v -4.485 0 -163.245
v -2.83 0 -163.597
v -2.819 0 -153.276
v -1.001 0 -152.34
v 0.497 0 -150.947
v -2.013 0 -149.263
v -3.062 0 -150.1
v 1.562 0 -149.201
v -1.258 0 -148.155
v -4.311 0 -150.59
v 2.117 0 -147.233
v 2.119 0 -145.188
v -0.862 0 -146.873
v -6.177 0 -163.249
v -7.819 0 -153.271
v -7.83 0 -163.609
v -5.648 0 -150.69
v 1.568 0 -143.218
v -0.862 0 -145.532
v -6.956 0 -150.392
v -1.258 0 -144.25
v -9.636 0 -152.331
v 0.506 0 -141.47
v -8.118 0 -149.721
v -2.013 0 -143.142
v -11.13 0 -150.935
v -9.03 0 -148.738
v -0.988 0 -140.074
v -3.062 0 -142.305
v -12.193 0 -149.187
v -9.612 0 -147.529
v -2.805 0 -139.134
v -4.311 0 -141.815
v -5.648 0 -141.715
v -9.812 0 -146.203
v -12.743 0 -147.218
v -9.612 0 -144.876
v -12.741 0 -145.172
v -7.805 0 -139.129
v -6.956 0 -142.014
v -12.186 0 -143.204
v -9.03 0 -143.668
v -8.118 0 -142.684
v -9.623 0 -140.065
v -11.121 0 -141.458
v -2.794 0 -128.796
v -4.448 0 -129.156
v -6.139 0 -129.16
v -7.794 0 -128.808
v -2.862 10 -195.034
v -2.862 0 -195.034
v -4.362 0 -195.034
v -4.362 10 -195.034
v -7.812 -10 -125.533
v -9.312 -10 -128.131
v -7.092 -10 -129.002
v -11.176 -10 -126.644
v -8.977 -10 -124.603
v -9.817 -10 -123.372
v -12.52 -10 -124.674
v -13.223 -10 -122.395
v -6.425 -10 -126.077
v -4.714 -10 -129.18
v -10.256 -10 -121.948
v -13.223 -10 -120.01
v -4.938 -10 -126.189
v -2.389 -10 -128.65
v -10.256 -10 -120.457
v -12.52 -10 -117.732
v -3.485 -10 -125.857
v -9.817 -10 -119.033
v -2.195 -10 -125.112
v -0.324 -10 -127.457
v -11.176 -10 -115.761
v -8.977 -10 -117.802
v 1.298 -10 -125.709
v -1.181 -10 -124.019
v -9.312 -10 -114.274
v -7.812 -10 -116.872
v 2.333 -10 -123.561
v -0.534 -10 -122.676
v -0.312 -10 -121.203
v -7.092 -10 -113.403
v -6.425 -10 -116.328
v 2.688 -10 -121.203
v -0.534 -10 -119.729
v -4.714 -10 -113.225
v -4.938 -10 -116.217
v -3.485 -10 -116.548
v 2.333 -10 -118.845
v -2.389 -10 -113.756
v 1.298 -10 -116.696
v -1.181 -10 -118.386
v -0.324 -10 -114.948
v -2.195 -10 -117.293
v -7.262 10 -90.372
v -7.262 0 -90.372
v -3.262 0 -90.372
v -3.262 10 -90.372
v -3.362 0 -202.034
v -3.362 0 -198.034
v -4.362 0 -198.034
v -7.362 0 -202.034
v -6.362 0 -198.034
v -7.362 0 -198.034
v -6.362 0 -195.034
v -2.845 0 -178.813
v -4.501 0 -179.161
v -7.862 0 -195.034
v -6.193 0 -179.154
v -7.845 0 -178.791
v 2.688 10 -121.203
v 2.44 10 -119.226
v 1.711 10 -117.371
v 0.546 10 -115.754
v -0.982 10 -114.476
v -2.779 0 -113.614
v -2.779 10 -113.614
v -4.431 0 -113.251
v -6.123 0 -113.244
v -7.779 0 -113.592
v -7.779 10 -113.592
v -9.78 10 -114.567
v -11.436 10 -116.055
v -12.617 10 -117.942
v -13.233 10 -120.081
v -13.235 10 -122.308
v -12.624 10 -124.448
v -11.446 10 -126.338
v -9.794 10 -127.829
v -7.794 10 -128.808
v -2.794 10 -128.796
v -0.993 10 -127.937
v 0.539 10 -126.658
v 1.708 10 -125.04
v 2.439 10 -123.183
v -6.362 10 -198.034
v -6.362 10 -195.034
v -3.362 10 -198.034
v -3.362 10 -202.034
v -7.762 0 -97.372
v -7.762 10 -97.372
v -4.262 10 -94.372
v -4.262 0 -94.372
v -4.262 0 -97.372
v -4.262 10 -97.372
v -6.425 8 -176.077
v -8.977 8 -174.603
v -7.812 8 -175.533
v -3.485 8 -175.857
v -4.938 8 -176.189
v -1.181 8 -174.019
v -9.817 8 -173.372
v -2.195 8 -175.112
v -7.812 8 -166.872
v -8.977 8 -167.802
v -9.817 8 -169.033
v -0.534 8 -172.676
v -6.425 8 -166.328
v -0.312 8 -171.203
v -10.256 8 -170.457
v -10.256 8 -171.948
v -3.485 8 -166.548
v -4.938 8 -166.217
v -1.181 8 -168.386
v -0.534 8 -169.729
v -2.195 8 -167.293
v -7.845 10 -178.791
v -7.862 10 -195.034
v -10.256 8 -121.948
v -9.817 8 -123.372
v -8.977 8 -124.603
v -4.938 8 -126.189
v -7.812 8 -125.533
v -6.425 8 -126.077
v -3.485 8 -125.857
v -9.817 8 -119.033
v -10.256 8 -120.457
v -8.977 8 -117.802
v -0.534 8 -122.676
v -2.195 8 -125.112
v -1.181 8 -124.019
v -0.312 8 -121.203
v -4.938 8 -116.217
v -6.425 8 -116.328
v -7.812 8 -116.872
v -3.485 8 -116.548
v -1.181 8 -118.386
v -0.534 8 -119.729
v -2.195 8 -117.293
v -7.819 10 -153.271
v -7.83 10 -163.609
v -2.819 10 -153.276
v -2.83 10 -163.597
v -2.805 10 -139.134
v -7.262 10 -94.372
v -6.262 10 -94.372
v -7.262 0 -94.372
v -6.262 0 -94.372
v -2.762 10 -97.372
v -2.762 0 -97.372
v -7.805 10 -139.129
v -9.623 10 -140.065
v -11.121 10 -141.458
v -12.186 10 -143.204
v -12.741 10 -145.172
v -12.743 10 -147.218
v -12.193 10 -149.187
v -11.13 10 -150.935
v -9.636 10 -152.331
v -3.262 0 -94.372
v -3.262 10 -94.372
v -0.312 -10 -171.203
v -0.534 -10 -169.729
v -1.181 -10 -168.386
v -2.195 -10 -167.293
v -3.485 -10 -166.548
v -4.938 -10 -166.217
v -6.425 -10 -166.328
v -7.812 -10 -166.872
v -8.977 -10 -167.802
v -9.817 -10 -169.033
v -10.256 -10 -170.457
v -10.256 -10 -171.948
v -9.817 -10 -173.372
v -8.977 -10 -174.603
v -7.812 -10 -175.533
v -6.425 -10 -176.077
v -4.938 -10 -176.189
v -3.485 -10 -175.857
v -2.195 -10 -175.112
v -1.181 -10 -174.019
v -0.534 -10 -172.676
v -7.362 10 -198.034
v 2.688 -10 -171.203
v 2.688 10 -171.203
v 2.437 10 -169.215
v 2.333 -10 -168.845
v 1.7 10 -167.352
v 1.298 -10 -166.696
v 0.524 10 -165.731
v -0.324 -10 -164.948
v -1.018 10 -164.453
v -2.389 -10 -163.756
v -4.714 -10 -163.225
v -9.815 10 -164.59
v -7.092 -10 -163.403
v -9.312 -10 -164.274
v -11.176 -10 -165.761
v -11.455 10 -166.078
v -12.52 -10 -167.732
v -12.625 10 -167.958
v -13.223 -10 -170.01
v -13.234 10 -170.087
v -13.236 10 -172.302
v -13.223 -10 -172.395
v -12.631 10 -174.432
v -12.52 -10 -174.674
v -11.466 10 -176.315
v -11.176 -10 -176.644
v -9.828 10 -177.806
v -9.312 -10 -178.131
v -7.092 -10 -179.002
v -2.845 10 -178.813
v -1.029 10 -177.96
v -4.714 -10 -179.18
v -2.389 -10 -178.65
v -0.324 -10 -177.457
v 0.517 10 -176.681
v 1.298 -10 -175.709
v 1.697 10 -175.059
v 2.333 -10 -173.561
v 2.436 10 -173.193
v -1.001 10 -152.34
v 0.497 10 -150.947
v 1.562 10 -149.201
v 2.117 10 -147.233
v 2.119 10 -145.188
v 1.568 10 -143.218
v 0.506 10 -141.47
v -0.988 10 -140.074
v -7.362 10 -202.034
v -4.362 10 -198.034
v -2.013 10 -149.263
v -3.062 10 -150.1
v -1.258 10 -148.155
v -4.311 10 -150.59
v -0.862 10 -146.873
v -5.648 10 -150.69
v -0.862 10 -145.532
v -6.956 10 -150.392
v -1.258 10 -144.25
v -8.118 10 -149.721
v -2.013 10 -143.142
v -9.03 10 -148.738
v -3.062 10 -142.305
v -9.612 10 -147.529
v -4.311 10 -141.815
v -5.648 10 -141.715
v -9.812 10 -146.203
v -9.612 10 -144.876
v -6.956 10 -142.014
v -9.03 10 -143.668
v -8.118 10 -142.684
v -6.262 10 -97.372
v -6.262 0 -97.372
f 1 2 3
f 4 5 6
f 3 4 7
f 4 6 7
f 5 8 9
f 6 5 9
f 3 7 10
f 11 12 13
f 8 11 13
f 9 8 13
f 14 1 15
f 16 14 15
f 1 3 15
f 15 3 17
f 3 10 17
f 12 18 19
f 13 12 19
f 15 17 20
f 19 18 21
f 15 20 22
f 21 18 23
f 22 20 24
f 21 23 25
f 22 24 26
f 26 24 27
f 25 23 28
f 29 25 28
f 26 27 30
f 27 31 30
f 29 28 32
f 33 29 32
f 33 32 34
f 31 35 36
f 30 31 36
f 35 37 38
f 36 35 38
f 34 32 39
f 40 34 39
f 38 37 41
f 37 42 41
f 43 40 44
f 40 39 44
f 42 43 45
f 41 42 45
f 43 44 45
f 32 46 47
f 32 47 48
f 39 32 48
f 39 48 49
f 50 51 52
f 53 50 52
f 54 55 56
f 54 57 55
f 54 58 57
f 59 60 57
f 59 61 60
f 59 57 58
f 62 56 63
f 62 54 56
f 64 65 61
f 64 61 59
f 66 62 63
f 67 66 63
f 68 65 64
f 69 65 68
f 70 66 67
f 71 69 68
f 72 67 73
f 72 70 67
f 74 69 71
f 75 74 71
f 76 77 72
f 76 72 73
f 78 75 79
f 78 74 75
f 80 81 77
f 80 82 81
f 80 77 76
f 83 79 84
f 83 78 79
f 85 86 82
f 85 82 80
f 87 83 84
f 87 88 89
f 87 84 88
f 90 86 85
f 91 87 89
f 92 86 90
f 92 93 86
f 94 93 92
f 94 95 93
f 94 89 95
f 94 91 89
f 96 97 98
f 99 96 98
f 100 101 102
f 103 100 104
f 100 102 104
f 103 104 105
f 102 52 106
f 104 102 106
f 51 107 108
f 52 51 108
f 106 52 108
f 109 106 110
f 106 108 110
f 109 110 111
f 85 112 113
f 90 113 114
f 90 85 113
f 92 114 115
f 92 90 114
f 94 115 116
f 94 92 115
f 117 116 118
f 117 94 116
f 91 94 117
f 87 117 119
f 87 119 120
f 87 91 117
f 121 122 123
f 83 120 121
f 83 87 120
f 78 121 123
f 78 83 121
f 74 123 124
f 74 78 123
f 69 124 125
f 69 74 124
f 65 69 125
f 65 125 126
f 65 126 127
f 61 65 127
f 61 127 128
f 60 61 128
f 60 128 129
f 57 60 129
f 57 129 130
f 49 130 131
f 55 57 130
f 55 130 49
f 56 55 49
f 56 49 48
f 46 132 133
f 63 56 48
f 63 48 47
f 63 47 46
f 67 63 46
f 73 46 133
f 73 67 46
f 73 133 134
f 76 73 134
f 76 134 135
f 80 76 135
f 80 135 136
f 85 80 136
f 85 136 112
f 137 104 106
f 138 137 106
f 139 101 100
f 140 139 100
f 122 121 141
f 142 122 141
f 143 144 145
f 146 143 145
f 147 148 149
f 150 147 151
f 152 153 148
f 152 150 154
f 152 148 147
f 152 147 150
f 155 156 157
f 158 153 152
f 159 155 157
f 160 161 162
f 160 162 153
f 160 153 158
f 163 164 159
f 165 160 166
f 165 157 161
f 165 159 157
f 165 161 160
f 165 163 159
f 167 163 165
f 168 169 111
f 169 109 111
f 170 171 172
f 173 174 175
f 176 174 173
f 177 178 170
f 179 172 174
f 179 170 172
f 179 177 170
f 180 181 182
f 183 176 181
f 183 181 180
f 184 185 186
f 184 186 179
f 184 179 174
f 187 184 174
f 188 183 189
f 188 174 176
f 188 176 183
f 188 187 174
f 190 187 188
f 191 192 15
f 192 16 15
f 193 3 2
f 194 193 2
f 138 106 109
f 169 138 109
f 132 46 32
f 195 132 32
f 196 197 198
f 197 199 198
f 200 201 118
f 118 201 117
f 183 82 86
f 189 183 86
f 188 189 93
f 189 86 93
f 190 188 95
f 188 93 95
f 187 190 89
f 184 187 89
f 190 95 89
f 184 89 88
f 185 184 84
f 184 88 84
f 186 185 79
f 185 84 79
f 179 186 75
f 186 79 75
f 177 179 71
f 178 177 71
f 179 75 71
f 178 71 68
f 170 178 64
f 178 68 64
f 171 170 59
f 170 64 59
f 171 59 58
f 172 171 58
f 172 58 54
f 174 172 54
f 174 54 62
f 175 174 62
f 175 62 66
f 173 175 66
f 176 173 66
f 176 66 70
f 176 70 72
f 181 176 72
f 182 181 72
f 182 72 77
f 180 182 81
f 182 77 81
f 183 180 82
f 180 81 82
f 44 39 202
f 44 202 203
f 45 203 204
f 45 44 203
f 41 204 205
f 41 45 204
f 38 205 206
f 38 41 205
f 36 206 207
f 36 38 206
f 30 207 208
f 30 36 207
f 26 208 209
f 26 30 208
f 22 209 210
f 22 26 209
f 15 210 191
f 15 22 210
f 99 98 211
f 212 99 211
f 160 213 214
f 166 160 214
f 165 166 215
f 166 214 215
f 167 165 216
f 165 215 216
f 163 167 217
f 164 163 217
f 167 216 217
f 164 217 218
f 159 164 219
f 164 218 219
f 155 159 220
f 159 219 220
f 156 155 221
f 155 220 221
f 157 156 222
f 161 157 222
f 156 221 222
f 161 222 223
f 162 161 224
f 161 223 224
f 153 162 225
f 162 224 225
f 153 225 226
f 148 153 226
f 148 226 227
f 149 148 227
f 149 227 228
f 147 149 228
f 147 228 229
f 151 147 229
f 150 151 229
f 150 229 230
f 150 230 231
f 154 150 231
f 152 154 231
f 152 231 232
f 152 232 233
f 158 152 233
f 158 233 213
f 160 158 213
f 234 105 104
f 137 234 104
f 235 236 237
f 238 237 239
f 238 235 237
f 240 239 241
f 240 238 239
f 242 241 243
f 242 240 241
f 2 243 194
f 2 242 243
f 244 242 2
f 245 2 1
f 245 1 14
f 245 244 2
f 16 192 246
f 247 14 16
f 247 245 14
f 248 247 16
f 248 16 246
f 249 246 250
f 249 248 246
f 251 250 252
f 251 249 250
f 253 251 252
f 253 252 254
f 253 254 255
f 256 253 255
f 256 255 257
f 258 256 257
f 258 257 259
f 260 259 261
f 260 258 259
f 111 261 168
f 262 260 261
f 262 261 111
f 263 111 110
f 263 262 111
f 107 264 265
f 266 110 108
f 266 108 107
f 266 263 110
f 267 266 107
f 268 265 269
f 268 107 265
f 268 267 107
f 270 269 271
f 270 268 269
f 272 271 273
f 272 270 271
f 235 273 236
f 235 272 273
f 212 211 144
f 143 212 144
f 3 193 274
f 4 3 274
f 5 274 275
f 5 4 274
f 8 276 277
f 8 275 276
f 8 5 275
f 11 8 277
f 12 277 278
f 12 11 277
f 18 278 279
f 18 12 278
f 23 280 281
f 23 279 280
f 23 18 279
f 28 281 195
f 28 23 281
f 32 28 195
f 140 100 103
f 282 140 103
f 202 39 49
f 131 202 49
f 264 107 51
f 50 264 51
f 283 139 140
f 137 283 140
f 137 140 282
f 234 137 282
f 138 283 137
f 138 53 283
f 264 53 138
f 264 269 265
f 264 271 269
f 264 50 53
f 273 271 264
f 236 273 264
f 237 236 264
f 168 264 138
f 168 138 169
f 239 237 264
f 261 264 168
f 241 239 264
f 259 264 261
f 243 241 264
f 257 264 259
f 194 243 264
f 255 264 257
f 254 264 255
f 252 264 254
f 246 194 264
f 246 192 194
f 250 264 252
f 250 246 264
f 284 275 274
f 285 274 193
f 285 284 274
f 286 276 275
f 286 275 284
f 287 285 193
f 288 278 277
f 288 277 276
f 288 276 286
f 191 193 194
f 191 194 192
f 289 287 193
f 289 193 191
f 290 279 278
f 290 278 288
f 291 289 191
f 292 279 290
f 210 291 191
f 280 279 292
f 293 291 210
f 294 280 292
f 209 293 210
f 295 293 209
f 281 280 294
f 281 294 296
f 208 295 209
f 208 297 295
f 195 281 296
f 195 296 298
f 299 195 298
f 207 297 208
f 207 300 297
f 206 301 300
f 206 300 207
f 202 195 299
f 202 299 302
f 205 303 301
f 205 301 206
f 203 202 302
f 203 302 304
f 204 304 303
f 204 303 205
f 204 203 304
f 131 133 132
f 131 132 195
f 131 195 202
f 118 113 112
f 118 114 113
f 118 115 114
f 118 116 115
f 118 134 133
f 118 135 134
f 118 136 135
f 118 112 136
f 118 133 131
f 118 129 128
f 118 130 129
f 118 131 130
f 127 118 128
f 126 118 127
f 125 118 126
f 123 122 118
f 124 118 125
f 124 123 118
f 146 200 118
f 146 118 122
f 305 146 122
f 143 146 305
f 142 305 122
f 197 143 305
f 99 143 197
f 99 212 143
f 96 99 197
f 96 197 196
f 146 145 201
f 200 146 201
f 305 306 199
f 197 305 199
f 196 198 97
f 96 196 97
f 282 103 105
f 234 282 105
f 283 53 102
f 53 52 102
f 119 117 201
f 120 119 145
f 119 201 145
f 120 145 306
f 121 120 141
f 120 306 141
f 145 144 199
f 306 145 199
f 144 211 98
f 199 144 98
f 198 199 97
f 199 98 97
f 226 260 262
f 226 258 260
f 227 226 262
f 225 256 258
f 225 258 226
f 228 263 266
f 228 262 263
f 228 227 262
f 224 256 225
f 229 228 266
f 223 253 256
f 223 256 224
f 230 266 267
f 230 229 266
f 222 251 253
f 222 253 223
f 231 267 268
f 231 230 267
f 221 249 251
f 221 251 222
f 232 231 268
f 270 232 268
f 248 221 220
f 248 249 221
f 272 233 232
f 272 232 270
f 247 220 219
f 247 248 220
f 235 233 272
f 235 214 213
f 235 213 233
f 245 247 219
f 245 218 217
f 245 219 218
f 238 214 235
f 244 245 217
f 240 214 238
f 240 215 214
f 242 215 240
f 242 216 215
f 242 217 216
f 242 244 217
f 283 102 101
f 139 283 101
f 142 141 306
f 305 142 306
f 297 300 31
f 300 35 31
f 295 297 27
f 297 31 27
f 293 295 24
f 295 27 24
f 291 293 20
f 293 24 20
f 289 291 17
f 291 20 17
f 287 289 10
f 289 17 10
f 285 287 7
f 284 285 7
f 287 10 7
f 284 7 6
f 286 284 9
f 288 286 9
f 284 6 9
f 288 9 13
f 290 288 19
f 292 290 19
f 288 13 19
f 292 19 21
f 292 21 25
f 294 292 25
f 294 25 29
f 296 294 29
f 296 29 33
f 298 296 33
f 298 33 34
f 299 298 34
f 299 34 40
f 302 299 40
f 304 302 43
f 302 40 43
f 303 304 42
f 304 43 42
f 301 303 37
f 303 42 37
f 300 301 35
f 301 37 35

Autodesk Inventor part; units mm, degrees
ref_plane "YZ Plane" through (0, 0, 0) normal (1, 0, 0) x (0, 1, 0)
ref_plane "XZ Plane" through (0, 0, 0) normal (0, 1, 0) x (-1, 0, 0)
ref_plane "XY Plane" through (0, 0, 0) normal (0, 0, 1) x (1, 0, 0)
sketch "Sketch1" plane through (0, 0, 0) normal (0, 1, 0) x (-1, 0, 0)
  line L0 (16.7626, -83.8715) -> (19.7626, -83.8715) projected
  line L1 (19.7626, -83.8715) -> (19.7626, -85.3715) projected
  line L2 (19.7626, -85.3715) -> (10.7873, -88.3968) projected
  line L3 (10.7873, -88.3968) -> (7.7622, -97.3718) projected
  line L4 (7.7622, -97.3718) -> (6.2622, -97.3718) projected
  line L5 (6.2622, -97.3718) -> (6.2622, -94.3718) projected
  line L6 (6.2622, -94.3718) -> (7.2622, -94.3718) projected
  line L7 (7.2622, -94.3718) -> (7.2622, -90.3718) projected
  line L8 (7.2622, -90.3718) -> (3.2622, -90.3718) projected
  line L9 (3.2622, -90.3718) -> (3.2622, -94.3718) projected
  line L10 (3.2622, -94.3718) -> (4.2622, -94.3718) projected
  line L11 (4.2622, -94.3718) -> (4.2622, -97.3718) projected
  line L12 (4.2622, -97.3718) -> (2.7622, -97.3718) projected
  line L13 (2.7622, -97.3718) -> (-1.3715, -85.1077) projected
  arc A0 (7.4979, -76.2381) -> (-1.3715, -85.1077) centre (5.2622, -82.8718) ccw projected
  line L14 (7.4979, -76.2381) -> (19.7626, -80.3715) projected
  line L15 (19.7626, -80.3715) -> (19.7626, -81.8715) projected
  line L16 (19.7626, -81.8715) -> (16.7626, -81.8715) projected
  line L17 (16.7626, -81.8715) -> (16.7626, -80.8715) projected
  line L18 (16.7626, -80.8715) -> (12.7626, -80.8715) projected
  line L19 (12.7626, -80.8715) -> (12.7626, -84.8715) projected
  line L20 (12.7626, -84.8715) -> (16.7626, -84.8715) projected
  line L21 (16.7626, -84.8715) -> (16.7626, -83.8715) projected
  line L22 (6.3619, -198.0335) -> (6.3619, -195.0335) projected
  line L23 (6.3619, -195.0335) -> (7.8619, -195.0335) projected
  line L24 (7.8619, -195.0335) -> (10.8872, -204.0087) projected
  line L25 (10.8872, -204.0087) -> (19.8622, -207.0338) projected
  line L26 (19.8622, -207.0338) -> (19.8622, -208.5338) projected
  line L27 (19.8622, -208.5338) -> (16.8622, -208.5338) projected
  line L28 (16.8622, -208.5338) -> (16.8622, -207.5338) projected
  line L29 (16.8622, -207.5338) -> (12.8622, -207.5338) projected
  line L30 (12.8622, -207.5338) -> (12.8622, -211.5338) projected
  line L31 (12.8622, -211.5338) -> (16.8622, -211.5338) projected
  line L32 (16.8622, -211.5338) -> (16.8622, -210.5338) projected
  line L33 (16.8622, -210.5338) -> (19.8622, -210.5338) projected
  line L34 (19.8622, -210.5338) -> (19.8622, -212.0338) projected
  line L35 (19.8622, -212.0338) -> (7.5981, -216.1675) projected
  arc A1 (-1.2715, -207.2981) -> (7.5981, -216.1675) centre (5.3622, -209.5338) ccw projected
  line L36 (-1.2715, -207.2981) -> (2.8619, -195.0335) projected
  line L37 (2.8619, -195.0335) -> (4.3619, -195.0335) projected
  line L38 (4.3619, -195.0335) -> (4.3619, -198.0335) projected
  line L39 (4.3619, -198.0335) -> (3.3619, -198.0335) projected
  line L40 (3.3619, -198.0335) -> (3.3619, -202.0335) projected
  line L41 (3.3619, -202.0335) -> (7.3619, -202.0335) projected
  line L42 (7.3619, -202.0335) -> (7.3619, -198.0335) projected
  line L43 (7.3619, -198.0335) -> (6.3619, -198.0335) projected
  line L44 (2.7622, -97.3718) -> (2.8619, -195.0335)
  line L45 (7.8619, -195.0335) -> (7.7622, -97.3718)
  line L46 (2.812, -146.2026) -> (7.812, -146.2026)
  circle A2 centre (5.312, -146.2026) radius 4.5
  circle A3 centre (5.312, -146.2026) radius 7.5
  point P0 (0, 0)
  point P1 (7.8048, -139.129)
  point P2 (2.8048, -139.1341)
  point P3 (2.8193, -153.2762)
  point P4 (7.8193, -153.2711)
  dimension "d8" = 9
  dimension "d9" = 15
extrude "Extrusion1" add sketch "Sketch1" along normal blind 10 contours L45 A3 L44 L12 L11 L10 L9 L8 L7 L6 L5 L4 | A3 L45 A2 | L45 A2 L44 A3 | L44 A2 A3 | A3 L44 A2 L45 | L45 L23 L22 L43 L42 L41 L40 L39 L38 L37 L44 A3
sketch "Sketch2" plane through (0, 0, 0) normal (0, -1, 0) x (1, 0, 0)
  line L0 (-4.3619, -198.0335) -> (-3.3619, -198.0335)
  line L1 (-4.3619, -195.0335) -> (-4.3619, -198.0335)
  line L2 (-2.8619, -195.0335) -> (-4.3619, -195.0335)
  line L3 (-2.7622, -97.3718) -> (-2.8619, -195.0335)
  line L4 (-4.2622, -97.3718) -> (-2.7622, -97.3718)
  line L5 (-4.2622, -94.3718) -> (-4.2622, -97.3718)
  line L6 (-3.2622, -94.3718) -> (-4.2622, -94.3718)
  line L7 (-3.2622, -90.3718) -> (-3.2622, -94.3718)
  line L8 (-7.2622, -90.3718) -> (-3.2622, -90.3718)
  line L9 (-7.2622, -94.3718) -> (-7.2622, -90.3718)
  line L10 (-6.2622, -94.3718) -> (-7.2622, -94.3718)
  line L11 (-6.2622, -97.3718) -> (-6.2622, -94.3718)
  line L12 (-7.7622, -97.3718) -> (-6.2622, -97.3718)
  line L13 (-7.8619, -195.0335) -> (-7.7622, -97.3718)
  line L14 (-6.3619, -195.0335) -> (-7.8619, -195.0335)
  line L15 (-6.3619, -198.0335) -> (-6.3619, -195.0335)
  line L16 (-7.3619, -198.0335) -> (-6.3619, -198.0335)
  line L17 (-7.3619, -202.0335) -> (-7.3619, -198.0335)
  line L18 (-3.3619, -202.0335) -> (-7.3619, -202.0335)
  line L19 (-3.3619, -198.0335) -> (-3.3619, -202.0335)
  line L20 (-7.812, -146.2026) -> (-2.812, -146.2026)
  line L21 (-6.2622, -97.3718) -> (-4.2622, -97.3718)
  line L22 (-5.312, -146.2026) -> (-5.312, -121.2026)
  line L23 (-5.312, -146.2026) -> (-5.312, -171.2026)
  circle A0 centre (-5.312, -171.2026) radius 8
  circle A1 centre (-5.312, -121.2026) radius 8
  point P0 (0, 0)
  dimension "d2" = 25
  dimension "d3" = 25
  dimension "d4" = 16
  dimension "d5" = 16
extrude "Extrusion2" add sketch "Sketch2" along normal mid plane 20 contours A0 L13 L3 | L3 A0 | A0 L13 | A1 L13 L3 | L3 A1 | A1 L13
sketch "Sketch3" plane through (-5.312, -10, -121.2026) normal (0, -1, 0) x (1, 0, 0)
  circle A0 centre (0, 0) radius 8 projected
  circle A1 centre (0, -50) radius 8 projected
  circle A2 centre (0, 0) radius 5
  circle A3 centre (0, -50) radius 5
  point P0 (5.312, 121.2026)
  dimension "d10" = 10
extrude "Extrusion3" cut sketch "Sketch3" against normal blind 18 contours A2 | A3
properties part number "Leg_rod"
